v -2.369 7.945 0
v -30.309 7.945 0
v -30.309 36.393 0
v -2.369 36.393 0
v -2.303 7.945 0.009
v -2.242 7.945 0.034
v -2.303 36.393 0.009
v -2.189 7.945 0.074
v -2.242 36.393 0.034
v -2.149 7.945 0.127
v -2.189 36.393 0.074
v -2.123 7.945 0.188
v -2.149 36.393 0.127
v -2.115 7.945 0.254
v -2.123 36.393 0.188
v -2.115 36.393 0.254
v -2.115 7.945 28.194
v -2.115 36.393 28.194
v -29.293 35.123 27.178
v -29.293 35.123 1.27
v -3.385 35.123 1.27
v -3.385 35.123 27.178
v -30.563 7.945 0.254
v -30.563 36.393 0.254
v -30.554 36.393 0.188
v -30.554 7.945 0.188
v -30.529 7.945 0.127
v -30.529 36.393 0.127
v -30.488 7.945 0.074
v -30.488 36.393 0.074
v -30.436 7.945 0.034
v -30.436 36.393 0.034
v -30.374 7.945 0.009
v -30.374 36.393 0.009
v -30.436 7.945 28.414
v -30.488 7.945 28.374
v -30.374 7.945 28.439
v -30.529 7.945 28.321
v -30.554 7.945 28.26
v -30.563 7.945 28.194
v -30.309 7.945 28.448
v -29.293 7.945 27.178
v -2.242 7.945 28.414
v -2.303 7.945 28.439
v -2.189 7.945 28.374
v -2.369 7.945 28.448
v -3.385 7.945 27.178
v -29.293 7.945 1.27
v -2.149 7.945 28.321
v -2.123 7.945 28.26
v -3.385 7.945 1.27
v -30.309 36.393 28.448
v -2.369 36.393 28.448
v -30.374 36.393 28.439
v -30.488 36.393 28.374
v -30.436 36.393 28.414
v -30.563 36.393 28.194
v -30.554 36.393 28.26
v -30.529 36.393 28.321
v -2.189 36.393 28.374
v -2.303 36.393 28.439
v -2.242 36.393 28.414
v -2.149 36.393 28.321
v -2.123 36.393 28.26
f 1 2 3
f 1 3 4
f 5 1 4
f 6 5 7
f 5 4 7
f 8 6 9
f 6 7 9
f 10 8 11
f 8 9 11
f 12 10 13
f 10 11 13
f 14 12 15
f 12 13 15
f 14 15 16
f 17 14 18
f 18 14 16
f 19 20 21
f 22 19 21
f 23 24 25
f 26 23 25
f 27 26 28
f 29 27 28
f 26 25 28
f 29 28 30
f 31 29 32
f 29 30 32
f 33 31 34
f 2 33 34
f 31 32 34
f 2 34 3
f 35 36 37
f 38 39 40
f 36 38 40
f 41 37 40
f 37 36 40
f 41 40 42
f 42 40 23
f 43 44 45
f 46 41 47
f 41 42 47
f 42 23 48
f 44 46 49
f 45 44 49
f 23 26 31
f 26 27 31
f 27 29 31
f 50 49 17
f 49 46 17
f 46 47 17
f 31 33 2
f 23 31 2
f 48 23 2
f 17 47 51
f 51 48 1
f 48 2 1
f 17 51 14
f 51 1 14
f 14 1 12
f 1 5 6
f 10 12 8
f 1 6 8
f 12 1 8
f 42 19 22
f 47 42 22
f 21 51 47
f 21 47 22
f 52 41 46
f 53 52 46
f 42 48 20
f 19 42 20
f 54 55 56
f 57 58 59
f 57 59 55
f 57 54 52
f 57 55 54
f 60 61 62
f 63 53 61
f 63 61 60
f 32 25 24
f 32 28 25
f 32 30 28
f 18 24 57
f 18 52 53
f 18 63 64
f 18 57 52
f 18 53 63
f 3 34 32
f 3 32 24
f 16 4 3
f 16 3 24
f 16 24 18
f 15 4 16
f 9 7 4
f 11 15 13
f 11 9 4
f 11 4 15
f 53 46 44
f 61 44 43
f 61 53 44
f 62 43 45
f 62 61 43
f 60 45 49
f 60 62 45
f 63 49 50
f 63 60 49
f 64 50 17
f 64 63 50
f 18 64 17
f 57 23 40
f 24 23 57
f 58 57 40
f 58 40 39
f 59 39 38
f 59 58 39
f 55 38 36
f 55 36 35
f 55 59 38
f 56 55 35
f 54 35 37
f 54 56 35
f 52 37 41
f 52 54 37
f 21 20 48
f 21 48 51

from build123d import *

# Parameters (mm, degrees)
F0_W     = 61.1250735819
F0_H     = 72.7862343192
F1_DEPTH = 28.448
F2_DEPTH = 32.6771
F3_DEPTH = 41.03624
F4_R     = 0.254
F5_T     = -1.27
F6_DEPTH = 3.302


with BuildPart() as f1:
    # F0 (on Top) → F1 (new body)
    with BuildSketch(Plane.XY):
        Rectangle(F0_W, F0_H)
    extrude(amount=F1_DEPTH)

    # F2 (cut): a face of the model
    f2_faces = [f1.faces().sort_by_distance(p)[0] for p in [
        (30.562536791, 0, 14.224),
    ]]
    extrude(f2_faces, amount=-F2_DEPTH, mode=Mode.SUBTRACT)

    # F3 (cut): a face of the model
    f3_faces = [f1.faces().sort_by_distance(p)[0] for p in [
        (-16.33855, -36.3931171596, 14.224),
    ]]
    extrude(f3_faces, amount=-F3_DEPTH, mode=Mode.SUBTRACT)

    # F4
    f4_edges = [f1.edges().sort_by_distance(p)[0] for p in [
        (-2.114563, 20.51812, 28.448),
        (-30.562537, 20.51812, 28.448),
        (-2.114563, 20.51812, 0),
        (-30.562537, 20.51812, 0),
    ]]
    fillet(f4_edges, radius=F4_R)

    # F5
    f5_openings = [f1.faces().sort_by_distance(p)[0] for p in [
        (-16.33855, 4.643123, 14.224),
    ]]
    offset(amount=F5_T, openings=f5_openings)

    # F6 (cut): a face of the model
    f6_faces = [f1.faces().sort_by_distance(p)[0] for p in [
        (-16.33855, 4.6431228404, 0.4023152874),
    ]]
    extrude(f6_faces, amount=-F6_DEPTH, mode=Mode.SUBTRACT)


solid = f1.part
